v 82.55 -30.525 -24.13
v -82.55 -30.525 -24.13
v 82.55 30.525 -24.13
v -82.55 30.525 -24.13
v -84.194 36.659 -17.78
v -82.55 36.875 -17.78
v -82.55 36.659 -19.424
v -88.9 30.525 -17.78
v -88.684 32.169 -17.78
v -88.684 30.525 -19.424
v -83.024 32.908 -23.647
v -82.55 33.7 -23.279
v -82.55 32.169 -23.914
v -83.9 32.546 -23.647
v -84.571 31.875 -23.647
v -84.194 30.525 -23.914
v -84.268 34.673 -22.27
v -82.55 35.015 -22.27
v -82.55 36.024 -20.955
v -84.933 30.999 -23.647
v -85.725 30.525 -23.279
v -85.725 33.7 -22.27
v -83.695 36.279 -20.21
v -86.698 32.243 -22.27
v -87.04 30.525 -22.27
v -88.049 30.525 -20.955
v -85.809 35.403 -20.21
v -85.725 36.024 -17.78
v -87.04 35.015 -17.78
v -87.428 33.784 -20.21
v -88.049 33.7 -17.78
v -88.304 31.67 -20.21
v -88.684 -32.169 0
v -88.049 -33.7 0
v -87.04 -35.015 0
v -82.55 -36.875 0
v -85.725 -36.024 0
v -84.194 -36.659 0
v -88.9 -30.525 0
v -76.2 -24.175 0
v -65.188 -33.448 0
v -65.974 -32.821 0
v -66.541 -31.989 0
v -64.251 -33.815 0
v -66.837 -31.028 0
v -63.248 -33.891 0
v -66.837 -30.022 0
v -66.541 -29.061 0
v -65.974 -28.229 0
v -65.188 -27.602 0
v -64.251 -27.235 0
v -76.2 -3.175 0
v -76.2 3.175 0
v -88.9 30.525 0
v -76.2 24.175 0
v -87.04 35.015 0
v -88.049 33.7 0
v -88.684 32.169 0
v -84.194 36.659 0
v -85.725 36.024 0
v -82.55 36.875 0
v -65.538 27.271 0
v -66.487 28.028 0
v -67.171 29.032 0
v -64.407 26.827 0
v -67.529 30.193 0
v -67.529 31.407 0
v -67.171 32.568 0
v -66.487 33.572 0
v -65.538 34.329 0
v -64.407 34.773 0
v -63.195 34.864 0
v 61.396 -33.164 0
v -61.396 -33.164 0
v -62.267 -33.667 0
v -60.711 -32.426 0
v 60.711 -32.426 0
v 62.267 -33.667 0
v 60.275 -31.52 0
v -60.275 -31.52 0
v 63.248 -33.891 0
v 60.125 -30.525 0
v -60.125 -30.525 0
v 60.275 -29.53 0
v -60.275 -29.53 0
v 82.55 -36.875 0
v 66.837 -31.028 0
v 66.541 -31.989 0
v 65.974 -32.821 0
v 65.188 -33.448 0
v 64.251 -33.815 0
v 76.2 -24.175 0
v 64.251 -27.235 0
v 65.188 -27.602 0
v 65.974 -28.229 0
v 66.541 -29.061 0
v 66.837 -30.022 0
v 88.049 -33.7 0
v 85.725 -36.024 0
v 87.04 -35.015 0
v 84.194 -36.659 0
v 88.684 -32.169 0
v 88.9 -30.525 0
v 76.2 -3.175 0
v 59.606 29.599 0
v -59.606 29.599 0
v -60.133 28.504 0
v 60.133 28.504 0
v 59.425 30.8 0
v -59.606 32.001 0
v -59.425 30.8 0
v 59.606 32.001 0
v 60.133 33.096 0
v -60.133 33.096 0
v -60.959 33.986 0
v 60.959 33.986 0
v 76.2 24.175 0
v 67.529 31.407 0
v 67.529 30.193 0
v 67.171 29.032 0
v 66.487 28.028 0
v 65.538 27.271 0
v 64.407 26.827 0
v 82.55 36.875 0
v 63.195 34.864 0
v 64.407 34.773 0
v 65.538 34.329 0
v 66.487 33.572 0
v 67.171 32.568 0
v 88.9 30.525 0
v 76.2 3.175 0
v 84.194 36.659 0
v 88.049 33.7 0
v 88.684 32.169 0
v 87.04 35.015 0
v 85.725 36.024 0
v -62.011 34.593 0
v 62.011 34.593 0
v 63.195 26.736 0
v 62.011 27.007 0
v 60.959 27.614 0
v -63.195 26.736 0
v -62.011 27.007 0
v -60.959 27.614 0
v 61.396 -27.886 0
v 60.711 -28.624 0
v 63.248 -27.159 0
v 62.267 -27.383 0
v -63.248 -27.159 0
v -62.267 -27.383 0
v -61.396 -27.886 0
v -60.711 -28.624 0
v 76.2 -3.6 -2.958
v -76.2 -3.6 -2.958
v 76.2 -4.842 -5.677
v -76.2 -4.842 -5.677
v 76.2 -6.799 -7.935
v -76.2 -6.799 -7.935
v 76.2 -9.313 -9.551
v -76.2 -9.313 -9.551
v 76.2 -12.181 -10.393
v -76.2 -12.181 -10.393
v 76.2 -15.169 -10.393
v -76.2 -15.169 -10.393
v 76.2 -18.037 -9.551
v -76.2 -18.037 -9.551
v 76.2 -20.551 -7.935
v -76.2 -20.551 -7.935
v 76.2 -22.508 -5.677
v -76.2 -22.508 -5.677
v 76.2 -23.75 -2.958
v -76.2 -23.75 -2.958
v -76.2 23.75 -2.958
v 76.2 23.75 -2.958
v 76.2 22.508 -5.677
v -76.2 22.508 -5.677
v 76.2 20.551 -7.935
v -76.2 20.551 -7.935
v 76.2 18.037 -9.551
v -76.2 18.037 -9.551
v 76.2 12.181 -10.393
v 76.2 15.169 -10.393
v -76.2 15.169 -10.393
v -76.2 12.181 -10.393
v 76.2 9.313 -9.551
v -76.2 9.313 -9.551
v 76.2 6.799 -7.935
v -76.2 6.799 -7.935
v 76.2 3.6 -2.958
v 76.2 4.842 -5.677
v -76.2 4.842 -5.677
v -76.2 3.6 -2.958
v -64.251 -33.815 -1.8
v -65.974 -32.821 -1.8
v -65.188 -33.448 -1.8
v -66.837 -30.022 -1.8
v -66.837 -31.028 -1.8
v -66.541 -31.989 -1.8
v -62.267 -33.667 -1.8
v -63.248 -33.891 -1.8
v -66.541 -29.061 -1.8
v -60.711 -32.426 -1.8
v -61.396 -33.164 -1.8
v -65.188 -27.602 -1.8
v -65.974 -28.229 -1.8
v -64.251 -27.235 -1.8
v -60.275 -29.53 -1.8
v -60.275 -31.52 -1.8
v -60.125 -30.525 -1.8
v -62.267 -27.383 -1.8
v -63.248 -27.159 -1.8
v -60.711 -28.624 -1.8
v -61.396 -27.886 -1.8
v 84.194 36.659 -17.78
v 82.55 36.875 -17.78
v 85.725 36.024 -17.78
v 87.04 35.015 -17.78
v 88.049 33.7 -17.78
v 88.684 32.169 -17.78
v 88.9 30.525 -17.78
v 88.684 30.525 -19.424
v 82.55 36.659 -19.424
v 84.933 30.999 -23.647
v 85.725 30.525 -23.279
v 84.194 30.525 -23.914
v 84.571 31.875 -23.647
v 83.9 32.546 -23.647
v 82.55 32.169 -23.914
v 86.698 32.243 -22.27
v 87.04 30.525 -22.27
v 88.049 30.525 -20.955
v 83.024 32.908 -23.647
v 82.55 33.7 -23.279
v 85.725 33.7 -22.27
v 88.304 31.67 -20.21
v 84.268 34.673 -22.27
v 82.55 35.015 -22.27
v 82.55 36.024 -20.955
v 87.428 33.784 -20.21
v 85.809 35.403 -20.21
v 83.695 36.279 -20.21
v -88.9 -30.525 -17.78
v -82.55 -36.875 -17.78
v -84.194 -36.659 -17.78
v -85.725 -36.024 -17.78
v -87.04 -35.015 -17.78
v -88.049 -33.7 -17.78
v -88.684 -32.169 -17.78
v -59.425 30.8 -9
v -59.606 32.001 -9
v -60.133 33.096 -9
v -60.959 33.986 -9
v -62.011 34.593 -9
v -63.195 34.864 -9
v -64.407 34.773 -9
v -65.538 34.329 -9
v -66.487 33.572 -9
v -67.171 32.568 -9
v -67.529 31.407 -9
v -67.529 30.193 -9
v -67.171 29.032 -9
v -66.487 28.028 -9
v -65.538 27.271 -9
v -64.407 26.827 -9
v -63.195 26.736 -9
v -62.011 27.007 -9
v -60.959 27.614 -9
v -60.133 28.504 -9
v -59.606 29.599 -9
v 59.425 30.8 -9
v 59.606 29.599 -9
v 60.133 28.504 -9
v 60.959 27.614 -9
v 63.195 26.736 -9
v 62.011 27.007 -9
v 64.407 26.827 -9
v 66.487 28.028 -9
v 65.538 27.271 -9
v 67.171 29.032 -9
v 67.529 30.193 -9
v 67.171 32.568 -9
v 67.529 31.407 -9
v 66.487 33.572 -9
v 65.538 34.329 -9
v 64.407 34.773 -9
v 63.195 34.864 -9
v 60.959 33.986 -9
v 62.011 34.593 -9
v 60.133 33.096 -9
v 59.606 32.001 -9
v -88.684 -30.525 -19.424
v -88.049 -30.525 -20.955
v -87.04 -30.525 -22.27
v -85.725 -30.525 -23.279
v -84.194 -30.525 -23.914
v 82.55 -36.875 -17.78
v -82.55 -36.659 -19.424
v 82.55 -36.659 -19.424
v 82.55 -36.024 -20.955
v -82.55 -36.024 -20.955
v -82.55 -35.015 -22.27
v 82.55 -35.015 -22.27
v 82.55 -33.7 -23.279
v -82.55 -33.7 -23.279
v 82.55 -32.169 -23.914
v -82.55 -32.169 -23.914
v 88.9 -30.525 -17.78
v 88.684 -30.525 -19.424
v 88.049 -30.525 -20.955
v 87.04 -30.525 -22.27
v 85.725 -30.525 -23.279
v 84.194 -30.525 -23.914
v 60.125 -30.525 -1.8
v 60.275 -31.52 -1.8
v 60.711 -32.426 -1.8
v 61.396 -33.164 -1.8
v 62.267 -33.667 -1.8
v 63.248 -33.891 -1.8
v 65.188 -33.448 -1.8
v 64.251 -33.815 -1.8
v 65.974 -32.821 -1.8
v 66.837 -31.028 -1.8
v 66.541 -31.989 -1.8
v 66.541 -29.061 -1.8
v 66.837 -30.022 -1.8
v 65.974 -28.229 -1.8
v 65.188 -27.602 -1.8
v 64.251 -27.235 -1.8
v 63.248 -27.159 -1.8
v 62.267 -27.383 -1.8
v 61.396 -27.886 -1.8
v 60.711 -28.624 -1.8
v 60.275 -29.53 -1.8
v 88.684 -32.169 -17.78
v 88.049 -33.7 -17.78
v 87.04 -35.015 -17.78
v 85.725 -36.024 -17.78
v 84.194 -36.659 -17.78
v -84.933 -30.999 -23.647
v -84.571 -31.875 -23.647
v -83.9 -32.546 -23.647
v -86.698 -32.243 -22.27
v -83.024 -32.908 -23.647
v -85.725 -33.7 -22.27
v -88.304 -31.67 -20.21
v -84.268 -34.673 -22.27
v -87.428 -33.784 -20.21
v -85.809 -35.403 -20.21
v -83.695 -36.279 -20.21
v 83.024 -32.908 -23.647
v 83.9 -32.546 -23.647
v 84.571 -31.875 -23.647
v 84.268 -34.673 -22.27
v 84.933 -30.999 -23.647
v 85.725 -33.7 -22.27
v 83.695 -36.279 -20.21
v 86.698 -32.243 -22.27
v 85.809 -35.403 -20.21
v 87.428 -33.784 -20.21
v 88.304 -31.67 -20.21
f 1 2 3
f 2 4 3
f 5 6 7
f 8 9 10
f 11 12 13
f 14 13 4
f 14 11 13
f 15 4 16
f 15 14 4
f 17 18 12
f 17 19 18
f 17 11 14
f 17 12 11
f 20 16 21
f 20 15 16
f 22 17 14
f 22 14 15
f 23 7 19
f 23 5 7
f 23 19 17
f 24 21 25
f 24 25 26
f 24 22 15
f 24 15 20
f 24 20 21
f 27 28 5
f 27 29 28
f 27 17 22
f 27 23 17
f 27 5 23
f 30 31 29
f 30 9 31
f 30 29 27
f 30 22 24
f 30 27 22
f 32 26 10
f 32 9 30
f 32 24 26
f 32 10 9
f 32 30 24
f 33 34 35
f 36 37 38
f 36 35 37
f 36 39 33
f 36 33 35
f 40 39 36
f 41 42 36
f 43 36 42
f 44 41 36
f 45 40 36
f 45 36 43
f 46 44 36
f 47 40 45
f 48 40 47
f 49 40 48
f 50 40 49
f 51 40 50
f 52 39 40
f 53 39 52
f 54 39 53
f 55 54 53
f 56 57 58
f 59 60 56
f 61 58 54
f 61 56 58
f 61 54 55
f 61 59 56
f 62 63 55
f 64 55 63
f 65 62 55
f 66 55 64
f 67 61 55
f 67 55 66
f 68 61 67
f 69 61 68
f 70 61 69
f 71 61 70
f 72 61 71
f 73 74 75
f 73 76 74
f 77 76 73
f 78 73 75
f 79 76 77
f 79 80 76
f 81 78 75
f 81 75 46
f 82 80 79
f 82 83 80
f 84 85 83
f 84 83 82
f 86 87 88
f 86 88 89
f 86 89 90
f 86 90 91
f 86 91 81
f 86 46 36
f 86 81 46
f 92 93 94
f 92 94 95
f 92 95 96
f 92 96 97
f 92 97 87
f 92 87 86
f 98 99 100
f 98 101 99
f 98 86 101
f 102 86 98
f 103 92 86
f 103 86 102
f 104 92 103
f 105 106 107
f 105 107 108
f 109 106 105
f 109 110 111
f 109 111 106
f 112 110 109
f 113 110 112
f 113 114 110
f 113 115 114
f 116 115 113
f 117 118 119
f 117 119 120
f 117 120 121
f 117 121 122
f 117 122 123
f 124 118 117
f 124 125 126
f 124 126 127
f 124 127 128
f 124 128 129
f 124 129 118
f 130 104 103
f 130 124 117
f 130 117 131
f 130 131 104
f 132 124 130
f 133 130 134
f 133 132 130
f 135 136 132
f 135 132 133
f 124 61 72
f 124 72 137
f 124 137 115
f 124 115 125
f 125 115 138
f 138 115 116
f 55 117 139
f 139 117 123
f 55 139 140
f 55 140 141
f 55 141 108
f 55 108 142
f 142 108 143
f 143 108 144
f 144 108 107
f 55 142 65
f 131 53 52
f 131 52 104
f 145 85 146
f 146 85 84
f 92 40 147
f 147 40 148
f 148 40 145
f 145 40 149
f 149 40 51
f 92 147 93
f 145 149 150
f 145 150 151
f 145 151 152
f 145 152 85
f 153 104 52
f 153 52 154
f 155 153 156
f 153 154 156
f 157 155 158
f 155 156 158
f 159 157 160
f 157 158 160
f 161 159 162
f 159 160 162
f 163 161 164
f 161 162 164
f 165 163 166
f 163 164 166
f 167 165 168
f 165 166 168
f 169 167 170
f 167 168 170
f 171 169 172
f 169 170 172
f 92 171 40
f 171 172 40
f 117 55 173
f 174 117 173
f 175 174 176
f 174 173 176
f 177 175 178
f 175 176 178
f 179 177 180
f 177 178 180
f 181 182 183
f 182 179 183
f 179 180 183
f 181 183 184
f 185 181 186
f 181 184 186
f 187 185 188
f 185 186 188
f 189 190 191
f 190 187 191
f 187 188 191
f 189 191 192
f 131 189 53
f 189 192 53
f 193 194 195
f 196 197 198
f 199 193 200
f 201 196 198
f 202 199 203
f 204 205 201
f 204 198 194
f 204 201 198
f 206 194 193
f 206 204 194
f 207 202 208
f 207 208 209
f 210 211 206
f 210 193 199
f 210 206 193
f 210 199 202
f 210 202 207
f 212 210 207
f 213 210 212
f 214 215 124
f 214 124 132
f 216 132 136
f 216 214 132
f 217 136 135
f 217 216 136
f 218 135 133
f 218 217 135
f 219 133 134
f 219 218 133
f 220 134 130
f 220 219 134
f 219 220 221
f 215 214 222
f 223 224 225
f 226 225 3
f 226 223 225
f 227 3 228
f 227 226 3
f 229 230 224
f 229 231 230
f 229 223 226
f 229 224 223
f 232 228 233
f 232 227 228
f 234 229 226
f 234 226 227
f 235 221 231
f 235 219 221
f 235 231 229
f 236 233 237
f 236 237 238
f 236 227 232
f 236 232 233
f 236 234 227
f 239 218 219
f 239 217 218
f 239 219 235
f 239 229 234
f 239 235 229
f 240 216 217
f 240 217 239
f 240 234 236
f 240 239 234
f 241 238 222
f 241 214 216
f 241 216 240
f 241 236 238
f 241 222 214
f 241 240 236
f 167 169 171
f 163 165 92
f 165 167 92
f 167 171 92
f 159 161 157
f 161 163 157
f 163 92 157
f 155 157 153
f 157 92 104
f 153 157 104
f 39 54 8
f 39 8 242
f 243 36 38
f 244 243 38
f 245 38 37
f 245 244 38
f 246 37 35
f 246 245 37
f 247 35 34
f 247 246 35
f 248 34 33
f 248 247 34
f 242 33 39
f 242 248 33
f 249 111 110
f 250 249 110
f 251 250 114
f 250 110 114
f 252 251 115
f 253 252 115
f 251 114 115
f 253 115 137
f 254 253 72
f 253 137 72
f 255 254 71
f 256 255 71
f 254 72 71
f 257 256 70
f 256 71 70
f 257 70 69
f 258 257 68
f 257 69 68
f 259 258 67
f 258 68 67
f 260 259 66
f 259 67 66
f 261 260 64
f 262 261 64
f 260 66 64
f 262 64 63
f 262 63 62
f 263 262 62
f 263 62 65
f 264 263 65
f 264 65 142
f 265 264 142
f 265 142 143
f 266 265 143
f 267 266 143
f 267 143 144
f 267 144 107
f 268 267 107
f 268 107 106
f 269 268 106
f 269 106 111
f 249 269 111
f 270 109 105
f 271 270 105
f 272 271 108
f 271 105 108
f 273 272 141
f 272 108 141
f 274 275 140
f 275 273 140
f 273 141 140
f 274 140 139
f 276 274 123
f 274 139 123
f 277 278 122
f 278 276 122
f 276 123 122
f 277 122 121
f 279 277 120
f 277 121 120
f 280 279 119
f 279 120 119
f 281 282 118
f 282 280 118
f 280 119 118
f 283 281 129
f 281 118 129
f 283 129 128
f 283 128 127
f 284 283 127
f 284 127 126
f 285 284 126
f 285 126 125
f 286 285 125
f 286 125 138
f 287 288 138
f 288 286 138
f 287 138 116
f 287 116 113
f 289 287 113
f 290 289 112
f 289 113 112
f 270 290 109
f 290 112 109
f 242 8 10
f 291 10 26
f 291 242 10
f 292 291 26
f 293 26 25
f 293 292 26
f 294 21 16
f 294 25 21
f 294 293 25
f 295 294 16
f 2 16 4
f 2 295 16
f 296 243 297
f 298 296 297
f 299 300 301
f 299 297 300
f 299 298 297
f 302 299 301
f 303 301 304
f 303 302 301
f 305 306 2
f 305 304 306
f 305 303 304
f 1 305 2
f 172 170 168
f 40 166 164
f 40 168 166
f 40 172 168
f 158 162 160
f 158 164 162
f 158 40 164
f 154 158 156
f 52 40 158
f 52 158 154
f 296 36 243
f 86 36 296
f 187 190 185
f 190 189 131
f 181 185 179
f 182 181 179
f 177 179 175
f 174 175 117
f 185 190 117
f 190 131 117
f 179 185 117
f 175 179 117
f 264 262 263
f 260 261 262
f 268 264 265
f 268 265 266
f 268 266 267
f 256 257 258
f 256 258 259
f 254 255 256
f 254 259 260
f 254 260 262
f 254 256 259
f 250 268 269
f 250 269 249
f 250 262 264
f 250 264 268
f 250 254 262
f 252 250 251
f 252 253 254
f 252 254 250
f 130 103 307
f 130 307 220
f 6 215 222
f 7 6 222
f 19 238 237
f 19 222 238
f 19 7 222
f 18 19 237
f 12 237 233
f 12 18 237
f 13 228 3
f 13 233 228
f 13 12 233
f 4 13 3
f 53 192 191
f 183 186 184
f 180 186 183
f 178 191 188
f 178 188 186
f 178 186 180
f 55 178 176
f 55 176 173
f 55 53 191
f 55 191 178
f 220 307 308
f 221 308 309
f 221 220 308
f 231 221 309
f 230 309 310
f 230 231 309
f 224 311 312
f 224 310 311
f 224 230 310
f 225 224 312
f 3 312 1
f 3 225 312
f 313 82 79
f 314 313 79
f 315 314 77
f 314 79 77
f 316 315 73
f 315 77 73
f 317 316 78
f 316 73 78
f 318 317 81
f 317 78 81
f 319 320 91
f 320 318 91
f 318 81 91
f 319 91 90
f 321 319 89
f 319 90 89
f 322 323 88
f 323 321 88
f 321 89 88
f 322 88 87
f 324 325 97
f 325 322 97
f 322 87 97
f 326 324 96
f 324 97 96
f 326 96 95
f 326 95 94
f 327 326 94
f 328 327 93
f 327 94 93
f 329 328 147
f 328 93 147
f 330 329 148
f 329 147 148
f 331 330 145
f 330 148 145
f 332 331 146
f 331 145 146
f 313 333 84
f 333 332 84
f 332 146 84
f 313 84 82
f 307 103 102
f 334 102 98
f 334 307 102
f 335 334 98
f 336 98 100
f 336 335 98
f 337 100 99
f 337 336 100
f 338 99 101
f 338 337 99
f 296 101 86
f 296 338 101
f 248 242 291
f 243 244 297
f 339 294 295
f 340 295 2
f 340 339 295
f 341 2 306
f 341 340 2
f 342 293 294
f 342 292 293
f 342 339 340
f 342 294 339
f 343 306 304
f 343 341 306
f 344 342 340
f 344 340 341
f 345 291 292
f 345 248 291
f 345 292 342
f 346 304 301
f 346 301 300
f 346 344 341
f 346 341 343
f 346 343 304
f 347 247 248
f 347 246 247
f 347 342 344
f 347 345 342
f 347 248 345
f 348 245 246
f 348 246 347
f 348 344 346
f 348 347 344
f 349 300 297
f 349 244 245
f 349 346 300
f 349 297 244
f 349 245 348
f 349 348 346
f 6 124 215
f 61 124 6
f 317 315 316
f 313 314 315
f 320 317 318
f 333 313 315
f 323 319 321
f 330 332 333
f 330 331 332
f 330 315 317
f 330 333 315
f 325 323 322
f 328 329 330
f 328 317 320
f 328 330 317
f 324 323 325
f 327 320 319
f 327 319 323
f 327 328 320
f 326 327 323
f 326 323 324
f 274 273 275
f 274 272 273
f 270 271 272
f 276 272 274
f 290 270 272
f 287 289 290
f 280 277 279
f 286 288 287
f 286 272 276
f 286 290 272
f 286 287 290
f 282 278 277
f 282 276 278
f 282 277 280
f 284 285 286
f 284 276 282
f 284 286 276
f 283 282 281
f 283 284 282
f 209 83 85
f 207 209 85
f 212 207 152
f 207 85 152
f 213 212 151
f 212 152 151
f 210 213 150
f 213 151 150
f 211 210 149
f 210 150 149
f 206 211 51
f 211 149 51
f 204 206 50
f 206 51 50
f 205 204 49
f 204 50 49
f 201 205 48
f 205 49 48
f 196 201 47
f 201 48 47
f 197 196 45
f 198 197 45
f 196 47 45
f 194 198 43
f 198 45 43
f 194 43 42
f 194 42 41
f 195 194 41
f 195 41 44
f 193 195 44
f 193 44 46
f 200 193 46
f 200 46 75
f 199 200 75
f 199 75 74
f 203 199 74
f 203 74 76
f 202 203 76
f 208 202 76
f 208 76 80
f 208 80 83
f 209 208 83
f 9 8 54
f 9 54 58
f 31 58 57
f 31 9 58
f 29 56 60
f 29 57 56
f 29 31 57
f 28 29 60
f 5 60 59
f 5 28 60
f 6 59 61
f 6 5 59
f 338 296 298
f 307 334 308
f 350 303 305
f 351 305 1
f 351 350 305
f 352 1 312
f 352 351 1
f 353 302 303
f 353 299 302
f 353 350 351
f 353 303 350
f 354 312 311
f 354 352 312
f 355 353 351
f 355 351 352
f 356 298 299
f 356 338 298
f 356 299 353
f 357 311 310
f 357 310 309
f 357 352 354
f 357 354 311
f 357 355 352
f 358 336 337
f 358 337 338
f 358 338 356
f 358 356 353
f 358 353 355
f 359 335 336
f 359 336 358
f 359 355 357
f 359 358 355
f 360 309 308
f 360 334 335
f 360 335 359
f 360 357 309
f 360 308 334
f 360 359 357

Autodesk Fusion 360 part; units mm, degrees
sketch "Cigar Box" plane through (0, 0, 0) normal (0, 0, 1) x (1, 0, 0)
  line L0 (88.9, 36.875) -> (-88.9, 36.875)
  line L1 (-88.9, 36.875) -> (-88.9, -36.875)
  line L2 (-88.9, -36.875) -> (88.9, -36.875)
  line L3 (88.9, -36.875) -> (88.9, 36.875)
  line L4 (88.9, 36.875) -> (-88.9, -36.875) construction
  line L5 (-88.9, 36.875) -> (88.9, -36.875) construction
  line L6 (76.2, 24.175) -> (-76.2, 24.175)
  line L7 (-76.2, 24.175) -> (-76.2, 3.175)
  line L8 (-76.2, 3.175) -> (76.2, 3.175)
  line L9 (76.2, 3.175) -> (76.2, 24.175)
  line L10 (76.2, 24.175) -> (-76.2, 3.175) construction
  line L11 (-76.2, 24.175) -> (76.2, 3.175) construction
  line L12 (-76.2, 13.675) -> (76.2, 13.675)
  circle A0 centre (-63.5, 30.8) radius 4.075
  line L13 (-63.5, 30.8) -> (-63.5, 34.875) construction
  line L14 (-63.5, 34.875) -> (-63.5, 36.875) construction
  circle A1 centre (-63.5, -30.525) radius 3.375
  point P0 (0, 13.675)
  dimension "d1" = 177.8
  dimension "d3" = 152.4
  dimension "d4" = 21
  dimension "d5" = 3.175
  dimension "d6" = 8.15
  dimension "d7" = 2
  dimension "d8" = 25.4
  dimension "d9" = 12.7
  dimension "d10" = 6.75
  dimension "d11" = 6.35
  dimension "d12" = 25.4
extrude "Extrude1" add sketch "Cigar Box" against normal blind 24.13 contours L0 L1 L2 L3 | L6 L7 L9 L12 | L7 L8 L9 L12 | A0 | A1
extrude "Extrude2" cut sketch "Cigar Box" against normal blind 9 contours A0
extrude "Extrude3" cut sketch "Cigar Box" against normal blind 1.8 contours A1
mirror "Mirror1" about plane through (0, 0, 0) normal (1, 0, 0) of "Extrude3", "Extrude2"
revolve "Revolve1" cut sketch "Cigar Box" angle 360 about axis through (-76.2, 13.675, 0) along (1, 0, 0) contours L6 L7 L9 L12
mirror "Mirror2" about plane through (0, 0, 0) normal (0, 1, 0) of "Revolve1"
fillet "Fillet1" radius 6.35 4 edges at (88.9, -36.875, -12.065) (88.9, 36.875, -12.065) (-88.9, 36.875, -12.065) (-88.9, -36.875, -12.065)
fillet "Fillet1" radius 6.35 1 faces at (29.6333, -12.2917, -24.13)
